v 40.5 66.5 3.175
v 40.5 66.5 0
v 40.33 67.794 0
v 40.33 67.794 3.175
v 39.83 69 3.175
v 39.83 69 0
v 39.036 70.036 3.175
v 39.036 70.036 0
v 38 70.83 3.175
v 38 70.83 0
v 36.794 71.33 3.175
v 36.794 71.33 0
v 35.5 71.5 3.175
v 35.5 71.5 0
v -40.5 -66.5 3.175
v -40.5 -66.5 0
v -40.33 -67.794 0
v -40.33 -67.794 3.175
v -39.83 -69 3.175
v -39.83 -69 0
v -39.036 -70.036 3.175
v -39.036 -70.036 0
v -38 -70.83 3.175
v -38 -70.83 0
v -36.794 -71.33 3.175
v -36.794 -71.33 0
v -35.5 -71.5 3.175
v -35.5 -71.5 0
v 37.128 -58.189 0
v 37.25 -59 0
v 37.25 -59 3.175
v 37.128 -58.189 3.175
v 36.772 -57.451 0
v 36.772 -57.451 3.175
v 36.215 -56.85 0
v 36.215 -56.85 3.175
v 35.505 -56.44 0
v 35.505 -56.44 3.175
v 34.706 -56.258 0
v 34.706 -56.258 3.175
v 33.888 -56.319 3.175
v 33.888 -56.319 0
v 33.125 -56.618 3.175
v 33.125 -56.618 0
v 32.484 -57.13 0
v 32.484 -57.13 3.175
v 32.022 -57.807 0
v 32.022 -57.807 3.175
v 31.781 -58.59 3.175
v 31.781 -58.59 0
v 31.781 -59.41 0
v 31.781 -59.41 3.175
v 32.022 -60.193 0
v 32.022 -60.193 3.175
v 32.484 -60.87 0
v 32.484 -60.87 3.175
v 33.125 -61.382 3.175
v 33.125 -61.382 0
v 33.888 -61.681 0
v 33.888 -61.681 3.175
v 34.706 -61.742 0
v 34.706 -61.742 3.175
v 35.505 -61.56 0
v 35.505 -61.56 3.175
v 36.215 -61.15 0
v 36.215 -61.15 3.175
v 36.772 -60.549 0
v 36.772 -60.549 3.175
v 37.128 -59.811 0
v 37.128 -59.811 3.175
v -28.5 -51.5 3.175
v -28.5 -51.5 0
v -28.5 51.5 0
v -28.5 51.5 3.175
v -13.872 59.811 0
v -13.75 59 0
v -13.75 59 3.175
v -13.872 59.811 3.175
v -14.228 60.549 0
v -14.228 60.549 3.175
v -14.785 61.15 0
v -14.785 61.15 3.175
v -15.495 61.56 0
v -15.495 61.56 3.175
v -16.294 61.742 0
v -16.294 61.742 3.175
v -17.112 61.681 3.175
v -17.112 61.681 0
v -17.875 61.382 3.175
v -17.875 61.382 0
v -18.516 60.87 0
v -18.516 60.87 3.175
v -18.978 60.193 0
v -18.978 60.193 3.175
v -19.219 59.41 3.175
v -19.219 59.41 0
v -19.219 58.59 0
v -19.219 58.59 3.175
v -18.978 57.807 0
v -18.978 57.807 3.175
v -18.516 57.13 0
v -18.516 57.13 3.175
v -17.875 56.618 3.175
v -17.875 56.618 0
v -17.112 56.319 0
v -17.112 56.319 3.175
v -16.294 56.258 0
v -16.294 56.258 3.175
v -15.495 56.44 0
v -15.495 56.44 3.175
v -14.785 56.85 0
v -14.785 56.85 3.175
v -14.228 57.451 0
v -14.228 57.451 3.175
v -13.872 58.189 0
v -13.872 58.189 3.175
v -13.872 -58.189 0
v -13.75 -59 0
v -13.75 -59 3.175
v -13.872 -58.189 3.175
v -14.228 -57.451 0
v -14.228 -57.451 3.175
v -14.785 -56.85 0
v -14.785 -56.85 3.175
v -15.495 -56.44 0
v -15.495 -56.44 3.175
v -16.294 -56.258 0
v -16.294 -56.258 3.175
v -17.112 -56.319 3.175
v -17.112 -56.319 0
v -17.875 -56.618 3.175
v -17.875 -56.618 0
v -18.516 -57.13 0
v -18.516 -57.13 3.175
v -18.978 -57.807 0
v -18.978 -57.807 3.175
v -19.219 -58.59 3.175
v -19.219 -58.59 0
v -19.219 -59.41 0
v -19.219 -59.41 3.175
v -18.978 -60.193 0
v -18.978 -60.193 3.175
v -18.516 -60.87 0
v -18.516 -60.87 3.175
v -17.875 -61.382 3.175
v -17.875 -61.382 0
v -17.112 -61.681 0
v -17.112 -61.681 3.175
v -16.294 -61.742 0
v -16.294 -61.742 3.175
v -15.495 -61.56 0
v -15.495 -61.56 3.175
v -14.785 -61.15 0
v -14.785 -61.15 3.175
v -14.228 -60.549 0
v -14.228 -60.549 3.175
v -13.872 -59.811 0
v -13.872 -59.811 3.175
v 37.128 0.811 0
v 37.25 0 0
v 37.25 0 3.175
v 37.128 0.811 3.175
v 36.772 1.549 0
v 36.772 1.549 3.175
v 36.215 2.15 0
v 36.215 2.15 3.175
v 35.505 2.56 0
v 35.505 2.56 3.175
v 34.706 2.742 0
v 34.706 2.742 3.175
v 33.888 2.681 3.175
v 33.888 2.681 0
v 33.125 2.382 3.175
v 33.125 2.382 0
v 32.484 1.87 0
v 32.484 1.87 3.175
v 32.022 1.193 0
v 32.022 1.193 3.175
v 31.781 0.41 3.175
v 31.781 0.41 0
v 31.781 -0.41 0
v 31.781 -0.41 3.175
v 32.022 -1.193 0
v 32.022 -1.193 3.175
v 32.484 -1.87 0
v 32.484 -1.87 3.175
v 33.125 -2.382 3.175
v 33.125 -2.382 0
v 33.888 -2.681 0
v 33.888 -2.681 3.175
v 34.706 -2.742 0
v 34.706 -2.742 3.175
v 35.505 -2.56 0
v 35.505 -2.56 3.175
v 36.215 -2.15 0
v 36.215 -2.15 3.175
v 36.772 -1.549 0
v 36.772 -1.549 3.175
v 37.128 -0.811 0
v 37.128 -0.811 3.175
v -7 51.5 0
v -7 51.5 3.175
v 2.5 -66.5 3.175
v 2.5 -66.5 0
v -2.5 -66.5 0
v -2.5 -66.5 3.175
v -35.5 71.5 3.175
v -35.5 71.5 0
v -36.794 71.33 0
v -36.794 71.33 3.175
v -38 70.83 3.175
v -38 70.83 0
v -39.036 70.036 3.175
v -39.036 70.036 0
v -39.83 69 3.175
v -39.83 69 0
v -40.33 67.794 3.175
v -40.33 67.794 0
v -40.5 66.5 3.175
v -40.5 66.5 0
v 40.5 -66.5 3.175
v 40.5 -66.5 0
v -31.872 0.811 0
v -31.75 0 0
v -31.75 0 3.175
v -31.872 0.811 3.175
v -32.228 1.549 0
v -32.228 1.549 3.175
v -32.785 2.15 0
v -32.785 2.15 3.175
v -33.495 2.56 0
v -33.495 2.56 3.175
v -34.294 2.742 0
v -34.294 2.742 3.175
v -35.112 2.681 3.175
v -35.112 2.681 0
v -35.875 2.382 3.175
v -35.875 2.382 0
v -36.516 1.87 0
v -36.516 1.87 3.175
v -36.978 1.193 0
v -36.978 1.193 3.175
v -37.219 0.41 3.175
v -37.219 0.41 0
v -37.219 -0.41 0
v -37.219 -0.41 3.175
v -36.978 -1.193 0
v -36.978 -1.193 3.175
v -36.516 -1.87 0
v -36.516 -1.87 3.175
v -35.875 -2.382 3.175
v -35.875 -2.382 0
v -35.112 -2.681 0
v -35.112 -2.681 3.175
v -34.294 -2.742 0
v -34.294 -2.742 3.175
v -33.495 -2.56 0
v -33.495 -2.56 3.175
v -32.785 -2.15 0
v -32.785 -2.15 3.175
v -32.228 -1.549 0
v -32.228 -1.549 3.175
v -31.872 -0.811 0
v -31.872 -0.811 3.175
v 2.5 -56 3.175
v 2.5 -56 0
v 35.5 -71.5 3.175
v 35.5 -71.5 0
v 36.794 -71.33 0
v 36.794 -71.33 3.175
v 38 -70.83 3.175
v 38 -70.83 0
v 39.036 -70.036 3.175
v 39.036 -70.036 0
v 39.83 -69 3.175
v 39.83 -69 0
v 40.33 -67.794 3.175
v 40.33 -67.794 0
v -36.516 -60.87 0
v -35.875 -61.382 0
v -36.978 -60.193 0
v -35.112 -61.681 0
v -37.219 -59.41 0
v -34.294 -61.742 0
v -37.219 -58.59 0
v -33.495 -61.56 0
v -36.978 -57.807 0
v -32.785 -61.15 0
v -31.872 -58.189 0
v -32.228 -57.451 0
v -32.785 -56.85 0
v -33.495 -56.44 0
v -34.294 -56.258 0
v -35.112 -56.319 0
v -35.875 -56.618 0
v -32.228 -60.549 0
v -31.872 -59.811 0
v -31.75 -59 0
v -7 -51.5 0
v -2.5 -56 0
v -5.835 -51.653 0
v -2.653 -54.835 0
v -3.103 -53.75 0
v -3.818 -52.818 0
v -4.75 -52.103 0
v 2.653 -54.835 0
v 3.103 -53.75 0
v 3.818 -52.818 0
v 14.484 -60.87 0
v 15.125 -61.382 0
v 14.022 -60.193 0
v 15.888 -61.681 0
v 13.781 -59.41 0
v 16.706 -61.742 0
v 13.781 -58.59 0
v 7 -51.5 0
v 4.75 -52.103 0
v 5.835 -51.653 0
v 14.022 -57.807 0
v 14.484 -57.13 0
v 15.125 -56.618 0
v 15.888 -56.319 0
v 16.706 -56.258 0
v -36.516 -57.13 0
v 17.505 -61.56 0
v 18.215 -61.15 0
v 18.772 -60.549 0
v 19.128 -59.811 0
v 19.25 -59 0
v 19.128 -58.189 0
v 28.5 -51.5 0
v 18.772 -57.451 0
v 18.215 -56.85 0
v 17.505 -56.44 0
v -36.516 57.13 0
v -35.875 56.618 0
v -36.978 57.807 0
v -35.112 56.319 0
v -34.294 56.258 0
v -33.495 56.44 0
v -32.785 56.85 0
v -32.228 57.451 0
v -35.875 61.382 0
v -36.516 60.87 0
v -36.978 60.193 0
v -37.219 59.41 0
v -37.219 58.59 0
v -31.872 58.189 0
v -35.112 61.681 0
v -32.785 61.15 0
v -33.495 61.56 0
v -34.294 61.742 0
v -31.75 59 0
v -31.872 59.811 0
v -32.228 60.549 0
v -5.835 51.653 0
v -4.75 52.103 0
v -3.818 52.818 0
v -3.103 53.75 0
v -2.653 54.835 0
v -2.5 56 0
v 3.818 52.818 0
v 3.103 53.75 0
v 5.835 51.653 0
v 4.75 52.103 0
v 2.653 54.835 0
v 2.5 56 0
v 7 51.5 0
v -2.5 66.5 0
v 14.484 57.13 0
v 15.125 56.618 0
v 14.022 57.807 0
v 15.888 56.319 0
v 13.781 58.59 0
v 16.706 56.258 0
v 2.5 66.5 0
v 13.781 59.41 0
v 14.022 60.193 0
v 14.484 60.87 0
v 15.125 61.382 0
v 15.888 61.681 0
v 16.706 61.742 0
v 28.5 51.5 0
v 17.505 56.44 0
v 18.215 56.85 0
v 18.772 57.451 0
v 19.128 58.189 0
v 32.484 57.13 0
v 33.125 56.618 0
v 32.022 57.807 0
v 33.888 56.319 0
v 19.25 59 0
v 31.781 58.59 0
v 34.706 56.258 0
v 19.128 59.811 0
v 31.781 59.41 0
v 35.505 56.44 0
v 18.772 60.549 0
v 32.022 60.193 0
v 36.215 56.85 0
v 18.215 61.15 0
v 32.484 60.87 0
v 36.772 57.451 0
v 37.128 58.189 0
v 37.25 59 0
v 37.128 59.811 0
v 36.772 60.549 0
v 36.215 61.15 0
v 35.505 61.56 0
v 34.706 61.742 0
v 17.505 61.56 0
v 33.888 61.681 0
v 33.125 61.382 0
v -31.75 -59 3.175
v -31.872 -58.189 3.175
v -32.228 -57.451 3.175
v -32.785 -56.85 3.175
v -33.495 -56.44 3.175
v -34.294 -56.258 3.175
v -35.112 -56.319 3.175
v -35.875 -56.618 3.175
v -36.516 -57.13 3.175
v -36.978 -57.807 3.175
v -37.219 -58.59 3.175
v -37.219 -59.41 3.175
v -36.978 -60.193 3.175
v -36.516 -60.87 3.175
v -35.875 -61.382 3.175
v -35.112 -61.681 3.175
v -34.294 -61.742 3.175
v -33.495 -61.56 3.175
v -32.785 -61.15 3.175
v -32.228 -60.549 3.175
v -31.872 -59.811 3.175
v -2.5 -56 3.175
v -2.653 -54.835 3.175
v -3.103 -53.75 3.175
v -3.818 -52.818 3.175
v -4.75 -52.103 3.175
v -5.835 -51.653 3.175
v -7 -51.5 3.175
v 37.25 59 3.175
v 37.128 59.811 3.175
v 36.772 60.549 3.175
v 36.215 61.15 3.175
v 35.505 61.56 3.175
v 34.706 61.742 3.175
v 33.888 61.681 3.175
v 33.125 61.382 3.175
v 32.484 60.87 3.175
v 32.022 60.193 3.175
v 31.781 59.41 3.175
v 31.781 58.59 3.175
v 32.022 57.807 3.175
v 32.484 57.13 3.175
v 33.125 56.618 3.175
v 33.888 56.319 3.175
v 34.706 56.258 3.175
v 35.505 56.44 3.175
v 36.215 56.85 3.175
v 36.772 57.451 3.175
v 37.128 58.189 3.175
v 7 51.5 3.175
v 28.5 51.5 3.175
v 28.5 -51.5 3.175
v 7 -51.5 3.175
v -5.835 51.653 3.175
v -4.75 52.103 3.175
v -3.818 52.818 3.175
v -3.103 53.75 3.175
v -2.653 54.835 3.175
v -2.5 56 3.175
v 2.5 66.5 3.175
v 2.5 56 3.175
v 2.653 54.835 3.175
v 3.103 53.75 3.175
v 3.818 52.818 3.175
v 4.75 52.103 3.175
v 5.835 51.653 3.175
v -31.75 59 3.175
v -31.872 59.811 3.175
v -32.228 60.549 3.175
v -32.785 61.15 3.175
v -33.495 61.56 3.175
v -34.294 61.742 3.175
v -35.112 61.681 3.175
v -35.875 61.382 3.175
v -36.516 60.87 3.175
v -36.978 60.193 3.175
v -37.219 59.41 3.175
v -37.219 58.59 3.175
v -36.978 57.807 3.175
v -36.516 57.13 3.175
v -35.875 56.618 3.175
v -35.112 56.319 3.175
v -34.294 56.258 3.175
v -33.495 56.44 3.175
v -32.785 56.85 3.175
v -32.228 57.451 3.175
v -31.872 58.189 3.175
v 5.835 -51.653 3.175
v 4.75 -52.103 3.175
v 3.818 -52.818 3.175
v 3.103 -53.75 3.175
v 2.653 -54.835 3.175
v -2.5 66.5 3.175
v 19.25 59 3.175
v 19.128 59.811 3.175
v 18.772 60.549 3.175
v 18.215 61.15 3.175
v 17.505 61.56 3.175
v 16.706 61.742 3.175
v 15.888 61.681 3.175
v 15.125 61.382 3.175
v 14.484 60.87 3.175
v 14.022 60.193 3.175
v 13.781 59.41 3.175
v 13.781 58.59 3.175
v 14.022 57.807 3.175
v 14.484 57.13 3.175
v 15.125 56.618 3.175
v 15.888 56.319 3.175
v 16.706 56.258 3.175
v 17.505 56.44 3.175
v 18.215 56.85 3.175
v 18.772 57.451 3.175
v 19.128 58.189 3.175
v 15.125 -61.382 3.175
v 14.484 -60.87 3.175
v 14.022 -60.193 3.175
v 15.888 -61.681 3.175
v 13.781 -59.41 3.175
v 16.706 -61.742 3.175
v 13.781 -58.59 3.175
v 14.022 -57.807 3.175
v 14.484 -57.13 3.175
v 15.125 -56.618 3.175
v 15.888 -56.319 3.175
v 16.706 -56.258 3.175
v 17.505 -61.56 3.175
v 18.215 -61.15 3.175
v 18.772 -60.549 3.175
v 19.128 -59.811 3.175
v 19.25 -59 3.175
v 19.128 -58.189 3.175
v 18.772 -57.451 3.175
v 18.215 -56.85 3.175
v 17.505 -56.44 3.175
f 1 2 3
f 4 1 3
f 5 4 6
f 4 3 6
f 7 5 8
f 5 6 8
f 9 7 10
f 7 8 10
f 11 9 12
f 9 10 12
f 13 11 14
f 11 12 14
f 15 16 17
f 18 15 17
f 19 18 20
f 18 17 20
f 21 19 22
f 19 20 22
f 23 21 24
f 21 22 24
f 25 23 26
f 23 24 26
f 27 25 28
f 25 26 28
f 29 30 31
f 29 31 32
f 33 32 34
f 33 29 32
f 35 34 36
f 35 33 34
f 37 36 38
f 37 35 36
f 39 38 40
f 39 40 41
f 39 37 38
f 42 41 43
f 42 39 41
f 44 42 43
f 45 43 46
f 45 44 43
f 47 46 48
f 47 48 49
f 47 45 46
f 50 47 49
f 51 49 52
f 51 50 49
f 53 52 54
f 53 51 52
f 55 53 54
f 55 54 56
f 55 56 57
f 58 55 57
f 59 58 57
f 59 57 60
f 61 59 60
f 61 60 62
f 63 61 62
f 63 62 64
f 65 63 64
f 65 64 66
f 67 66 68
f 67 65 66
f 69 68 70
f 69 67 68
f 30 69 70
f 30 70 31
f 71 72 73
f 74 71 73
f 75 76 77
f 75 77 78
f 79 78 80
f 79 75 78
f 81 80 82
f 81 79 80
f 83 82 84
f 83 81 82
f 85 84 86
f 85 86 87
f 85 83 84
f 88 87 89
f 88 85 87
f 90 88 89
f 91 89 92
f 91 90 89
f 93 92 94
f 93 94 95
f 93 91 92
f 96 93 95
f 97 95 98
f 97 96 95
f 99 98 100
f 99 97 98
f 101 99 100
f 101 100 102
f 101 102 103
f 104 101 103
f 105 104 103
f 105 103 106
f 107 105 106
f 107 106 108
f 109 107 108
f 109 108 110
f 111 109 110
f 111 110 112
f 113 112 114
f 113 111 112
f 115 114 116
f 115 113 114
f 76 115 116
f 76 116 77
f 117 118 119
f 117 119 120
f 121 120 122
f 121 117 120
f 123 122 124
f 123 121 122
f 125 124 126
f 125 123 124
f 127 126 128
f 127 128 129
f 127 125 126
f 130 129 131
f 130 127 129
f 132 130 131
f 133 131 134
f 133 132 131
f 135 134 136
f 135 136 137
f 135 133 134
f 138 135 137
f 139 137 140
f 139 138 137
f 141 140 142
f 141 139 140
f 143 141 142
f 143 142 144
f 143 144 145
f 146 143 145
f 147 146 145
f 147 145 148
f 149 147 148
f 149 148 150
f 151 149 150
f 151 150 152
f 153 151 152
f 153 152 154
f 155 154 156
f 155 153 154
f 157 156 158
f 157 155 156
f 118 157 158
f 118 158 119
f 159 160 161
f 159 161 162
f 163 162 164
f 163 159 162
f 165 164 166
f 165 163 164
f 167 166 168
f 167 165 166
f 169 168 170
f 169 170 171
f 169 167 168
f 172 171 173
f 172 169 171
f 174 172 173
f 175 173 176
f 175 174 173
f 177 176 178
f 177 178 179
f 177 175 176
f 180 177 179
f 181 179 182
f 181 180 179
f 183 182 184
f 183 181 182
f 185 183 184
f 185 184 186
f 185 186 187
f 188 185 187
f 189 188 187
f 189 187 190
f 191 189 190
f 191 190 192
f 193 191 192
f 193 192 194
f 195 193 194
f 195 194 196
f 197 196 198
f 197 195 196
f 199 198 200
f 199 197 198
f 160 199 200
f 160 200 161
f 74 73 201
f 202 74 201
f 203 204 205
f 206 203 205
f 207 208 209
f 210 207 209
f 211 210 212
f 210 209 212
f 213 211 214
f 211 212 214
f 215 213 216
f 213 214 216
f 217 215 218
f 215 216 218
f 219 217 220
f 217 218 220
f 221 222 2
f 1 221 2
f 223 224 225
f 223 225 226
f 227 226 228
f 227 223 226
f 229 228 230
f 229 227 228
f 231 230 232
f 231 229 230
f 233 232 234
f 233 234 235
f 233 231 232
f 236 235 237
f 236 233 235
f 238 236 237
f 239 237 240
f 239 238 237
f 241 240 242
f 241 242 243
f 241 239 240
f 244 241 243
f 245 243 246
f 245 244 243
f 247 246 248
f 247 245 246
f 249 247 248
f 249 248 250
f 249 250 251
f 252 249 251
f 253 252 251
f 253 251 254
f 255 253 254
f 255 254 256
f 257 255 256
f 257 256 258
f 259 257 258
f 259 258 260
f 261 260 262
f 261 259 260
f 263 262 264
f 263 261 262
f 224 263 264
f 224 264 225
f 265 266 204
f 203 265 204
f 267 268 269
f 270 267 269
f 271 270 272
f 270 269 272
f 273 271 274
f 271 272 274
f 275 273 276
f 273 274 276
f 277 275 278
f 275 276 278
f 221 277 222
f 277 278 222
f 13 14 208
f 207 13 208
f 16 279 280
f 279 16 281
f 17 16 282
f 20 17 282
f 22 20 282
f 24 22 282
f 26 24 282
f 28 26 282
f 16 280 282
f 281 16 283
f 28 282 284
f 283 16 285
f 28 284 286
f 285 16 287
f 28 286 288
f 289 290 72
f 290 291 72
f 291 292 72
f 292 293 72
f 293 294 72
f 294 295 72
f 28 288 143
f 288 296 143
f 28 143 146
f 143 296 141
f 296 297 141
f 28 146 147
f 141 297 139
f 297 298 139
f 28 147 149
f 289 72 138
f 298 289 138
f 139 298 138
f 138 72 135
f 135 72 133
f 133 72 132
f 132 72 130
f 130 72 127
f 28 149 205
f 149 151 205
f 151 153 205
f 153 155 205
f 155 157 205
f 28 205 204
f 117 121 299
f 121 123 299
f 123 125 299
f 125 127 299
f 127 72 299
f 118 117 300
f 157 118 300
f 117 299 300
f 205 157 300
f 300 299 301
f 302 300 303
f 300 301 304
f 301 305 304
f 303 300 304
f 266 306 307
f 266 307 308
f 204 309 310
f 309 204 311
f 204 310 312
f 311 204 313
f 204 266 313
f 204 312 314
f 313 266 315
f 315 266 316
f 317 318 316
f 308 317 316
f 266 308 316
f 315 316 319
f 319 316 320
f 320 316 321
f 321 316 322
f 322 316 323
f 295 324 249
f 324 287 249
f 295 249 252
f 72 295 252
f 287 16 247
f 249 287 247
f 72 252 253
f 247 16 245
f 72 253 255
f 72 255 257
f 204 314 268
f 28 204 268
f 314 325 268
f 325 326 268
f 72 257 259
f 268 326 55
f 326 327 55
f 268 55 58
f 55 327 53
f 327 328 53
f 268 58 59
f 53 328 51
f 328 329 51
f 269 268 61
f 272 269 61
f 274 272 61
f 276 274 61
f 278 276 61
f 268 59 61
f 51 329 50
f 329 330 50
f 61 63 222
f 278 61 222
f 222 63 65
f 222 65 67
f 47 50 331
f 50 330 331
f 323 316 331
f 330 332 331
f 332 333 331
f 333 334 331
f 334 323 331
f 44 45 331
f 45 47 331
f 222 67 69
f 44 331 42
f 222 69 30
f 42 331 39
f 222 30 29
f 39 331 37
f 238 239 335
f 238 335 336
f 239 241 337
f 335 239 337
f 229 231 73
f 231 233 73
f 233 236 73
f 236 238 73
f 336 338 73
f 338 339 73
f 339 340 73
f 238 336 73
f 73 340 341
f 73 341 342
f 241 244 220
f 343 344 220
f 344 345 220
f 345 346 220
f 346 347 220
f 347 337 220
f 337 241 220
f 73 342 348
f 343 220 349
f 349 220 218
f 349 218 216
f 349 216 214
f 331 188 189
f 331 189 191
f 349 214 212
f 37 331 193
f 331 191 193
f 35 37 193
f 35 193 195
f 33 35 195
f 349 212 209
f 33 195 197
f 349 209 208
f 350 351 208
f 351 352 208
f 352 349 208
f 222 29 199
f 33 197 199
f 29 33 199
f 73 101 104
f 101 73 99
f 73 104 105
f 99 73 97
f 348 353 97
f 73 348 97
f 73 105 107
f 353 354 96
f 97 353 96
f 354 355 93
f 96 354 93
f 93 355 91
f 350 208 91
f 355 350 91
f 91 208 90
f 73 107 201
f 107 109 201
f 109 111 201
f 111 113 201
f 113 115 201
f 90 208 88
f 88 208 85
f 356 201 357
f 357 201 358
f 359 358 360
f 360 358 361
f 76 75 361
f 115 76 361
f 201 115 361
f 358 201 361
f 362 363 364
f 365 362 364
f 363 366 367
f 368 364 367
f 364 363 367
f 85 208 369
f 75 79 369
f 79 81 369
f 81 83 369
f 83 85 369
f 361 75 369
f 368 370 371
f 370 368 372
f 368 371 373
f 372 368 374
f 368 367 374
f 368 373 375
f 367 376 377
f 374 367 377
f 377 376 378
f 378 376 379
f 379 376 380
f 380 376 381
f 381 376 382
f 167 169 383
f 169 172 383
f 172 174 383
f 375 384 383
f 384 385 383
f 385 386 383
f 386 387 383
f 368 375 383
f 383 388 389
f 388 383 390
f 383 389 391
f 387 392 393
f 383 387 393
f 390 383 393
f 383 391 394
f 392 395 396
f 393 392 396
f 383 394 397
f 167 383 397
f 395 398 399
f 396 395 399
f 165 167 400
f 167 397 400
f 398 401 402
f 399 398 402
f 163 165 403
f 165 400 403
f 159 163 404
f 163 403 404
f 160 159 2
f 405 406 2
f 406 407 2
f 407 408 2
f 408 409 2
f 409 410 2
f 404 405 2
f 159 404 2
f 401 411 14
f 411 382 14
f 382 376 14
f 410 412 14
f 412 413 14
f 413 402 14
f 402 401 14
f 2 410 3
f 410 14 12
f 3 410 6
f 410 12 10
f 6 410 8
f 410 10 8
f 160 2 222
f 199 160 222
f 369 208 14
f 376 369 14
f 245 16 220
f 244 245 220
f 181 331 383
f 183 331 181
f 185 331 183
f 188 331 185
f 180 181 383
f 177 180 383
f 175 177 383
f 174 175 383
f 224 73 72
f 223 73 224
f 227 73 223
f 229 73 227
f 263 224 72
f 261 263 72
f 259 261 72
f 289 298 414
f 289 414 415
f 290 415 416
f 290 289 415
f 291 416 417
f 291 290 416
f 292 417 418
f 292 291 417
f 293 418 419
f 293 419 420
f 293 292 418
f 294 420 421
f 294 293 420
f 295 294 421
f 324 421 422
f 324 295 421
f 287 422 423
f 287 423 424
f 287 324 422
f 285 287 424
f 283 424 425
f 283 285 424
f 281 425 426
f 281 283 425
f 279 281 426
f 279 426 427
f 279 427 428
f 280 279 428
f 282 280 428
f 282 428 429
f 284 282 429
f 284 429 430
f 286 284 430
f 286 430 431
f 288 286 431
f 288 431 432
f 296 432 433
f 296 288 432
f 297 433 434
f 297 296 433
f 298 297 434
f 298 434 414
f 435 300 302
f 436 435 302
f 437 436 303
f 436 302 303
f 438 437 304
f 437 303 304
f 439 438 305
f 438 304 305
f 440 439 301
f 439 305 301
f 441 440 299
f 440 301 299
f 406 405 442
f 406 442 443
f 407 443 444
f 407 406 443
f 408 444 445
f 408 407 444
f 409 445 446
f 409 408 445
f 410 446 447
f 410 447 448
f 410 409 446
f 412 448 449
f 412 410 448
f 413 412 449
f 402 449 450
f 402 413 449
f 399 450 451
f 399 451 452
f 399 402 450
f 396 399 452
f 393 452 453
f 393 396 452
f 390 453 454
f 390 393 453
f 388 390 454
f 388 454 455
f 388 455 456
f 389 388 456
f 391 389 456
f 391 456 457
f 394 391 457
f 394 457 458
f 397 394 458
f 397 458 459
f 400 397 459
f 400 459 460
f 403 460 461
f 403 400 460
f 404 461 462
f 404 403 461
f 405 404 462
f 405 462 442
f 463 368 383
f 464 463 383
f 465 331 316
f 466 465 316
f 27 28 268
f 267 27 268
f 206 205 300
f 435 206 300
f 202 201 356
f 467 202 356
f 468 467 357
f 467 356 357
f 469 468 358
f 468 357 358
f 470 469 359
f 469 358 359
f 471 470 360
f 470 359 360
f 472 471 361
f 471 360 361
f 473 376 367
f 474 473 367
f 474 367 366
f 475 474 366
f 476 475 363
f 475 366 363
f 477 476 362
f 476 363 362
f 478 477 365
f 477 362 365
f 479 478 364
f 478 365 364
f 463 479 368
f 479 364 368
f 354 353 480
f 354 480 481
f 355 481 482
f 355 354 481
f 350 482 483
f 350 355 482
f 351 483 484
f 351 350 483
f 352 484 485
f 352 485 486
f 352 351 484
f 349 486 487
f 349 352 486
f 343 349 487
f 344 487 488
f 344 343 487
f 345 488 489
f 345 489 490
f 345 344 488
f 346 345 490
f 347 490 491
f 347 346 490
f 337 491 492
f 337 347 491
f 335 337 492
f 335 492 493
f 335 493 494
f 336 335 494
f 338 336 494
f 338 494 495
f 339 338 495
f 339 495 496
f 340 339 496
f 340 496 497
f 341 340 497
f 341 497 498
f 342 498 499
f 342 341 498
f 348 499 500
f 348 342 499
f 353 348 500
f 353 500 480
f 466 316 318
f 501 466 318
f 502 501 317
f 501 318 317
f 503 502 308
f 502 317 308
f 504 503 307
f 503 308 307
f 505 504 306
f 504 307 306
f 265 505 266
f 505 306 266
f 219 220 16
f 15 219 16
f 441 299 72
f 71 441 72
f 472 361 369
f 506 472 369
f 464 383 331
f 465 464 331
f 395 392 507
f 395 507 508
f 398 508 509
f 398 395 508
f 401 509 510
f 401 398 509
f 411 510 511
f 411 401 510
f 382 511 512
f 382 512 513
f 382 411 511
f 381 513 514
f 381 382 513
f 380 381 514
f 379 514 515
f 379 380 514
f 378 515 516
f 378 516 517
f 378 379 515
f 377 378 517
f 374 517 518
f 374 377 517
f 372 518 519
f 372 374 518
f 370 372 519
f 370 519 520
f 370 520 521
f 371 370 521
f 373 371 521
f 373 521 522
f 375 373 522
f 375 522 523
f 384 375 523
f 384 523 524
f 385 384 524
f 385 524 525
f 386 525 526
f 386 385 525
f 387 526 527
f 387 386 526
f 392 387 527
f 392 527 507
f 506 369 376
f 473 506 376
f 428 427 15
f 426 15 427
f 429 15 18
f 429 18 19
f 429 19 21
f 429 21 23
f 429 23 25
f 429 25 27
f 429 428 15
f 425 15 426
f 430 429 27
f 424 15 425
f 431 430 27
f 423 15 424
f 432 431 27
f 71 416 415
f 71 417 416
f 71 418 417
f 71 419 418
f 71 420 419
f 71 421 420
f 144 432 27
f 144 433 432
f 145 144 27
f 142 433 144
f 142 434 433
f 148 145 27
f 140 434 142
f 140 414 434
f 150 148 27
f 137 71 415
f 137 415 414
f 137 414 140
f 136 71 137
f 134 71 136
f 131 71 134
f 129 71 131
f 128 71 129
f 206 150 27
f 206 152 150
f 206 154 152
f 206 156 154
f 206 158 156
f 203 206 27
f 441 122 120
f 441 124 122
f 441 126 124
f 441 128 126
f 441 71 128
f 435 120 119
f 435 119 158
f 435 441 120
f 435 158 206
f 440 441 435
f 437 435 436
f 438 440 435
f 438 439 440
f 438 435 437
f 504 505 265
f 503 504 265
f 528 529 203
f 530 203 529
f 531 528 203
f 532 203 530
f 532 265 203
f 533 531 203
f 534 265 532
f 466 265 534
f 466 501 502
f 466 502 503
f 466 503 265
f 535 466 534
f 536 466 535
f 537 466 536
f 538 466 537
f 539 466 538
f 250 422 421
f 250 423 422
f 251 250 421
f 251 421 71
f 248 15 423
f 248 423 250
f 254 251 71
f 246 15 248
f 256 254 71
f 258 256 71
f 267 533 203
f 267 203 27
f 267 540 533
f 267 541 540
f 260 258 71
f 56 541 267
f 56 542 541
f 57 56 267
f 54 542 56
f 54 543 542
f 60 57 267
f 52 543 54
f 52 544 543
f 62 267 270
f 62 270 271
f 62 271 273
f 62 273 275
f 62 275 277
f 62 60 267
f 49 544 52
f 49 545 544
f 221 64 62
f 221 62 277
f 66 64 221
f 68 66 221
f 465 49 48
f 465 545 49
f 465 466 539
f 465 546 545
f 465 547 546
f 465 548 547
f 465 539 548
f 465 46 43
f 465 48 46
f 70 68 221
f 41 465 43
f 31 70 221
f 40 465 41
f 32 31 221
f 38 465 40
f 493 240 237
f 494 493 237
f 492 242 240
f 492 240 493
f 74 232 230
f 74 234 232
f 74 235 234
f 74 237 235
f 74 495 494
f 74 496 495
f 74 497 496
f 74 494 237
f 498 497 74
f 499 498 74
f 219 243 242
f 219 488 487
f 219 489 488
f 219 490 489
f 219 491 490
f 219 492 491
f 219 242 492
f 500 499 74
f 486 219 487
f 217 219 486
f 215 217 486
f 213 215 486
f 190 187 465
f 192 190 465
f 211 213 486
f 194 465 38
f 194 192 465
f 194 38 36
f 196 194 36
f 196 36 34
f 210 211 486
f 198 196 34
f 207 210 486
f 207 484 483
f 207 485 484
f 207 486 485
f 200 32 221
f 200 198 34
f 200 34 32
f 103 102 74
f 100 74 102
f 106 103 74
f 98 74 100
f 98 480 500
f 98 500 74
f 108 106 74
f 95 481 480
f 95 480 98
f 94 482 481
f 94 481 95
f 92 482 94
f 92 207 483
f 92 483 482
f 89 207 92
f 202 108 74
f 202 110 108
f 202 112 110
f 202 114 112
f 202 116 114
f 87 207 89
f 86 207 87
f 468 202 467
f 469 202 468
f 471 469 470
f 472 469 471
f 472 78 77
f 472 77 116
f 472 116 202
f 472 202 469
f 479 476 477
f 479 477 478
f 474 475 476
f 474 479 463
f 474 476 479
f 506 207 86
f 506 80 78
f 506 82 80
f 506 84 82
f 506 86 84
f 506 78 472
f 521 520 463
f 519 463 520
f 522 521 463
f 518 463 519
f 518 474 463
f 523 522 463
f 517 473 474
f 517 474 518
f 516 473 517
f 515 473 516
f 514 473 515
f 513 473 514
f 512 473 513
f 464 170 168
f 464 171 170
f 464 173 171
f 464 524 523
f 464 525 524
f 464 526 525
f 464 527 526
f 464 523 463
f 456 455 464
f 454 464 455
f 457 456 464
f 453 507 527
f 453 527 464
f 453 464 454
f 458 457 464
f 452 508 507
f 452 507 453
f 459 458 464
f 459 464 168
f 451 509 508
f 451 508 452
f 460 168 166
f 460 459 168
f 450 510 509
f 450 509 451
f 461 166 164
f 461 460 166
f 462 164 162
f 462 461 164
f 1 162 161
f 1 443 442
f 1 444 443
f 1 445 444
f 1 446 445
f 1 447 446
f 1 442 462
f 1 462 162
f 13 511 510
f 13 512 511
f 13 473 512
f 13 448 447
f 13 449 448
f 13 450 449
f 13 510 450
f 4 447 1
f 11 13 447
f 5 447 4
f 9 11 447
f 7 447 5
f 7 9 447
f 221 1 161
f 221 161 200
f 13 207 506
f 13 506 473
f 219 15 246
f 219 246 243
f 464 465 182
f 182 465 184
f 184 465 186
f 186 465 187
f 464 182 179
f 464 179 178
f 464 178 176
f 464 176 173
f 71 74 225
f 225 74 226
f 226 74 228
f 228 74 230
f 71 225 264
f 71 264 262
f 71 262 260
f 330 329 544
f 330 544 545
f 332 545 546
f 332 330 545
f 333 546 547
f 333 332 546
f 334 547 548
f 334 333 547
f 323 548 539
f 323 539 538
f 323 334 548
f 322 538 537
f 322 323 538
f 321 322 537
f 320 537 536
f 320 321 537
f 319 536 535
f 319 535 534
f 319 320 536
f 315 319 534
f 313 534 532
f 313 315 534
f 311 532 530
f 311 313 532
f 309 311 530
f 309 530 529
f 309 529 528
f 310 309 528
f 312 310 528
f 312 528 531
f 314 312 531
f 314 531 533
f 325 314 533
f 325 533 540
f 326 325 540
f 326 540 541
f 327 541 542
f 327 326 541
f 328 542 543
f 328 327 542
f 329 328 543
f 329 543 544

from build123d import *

# Parameters (mm, degrees)
F0_R     = 2.75
F1_DEPTH = 3.175


# Not quite as in the source:
# - a length typed as a fraction of an inch, garbled in the dataset ("3 / 203.2 mm" for 3/8 in), is restored


with BuildPart() as f1:
    # F0 (on Top) → F1 (new body)
    with BuildSketch(Plane.XY):
        with BuildLine():
            Line((-35.5, -71.5), (35.5, -71.5))
            ThreePointArc((35.5, -71.5), (39.0355339059, -70.0355339059), (40.5, -66.5))
            Line((40.5, -66.5), (40.5, 66.5))
            ThreePointArc((40.5, 66.5), (39.0355339059, 70.0355339059), (35.5, 71.5))
            Line((35.5, 71.5), (-35.5, 71.5))
            ThreePointArc((-35.5, 71.5), (-39.0355339059, 70.0355339059), (-40.5, 66.5))
            Line((-40.5, 66.5), (-40.5, -66.5))
            ThreePointArc((-40.5, -66.5), (-39.0355339059, -70.0355339059), (-35.5, -71.5))
        make_face()
        with Locations((-34.5, -59)):
            Circle(F0_R, mode=Mode.SUBTRACT)
        with Locations((-16.5, -59)):
            Circle(F0_R, mode=Mode.SUBTRACT)
        with Locations((16.5, -59)):
            Circle(F0_R, mode=Mode.SUBTRACT)
        with Locations((34.5, -59)):
            Circle(F0_R, mode=Mode.SUBTRACT)
        with Locations((-34.5, 0)):
            Circle(F0_R, mode=Mode.SUBTRACT)
        with Locations((-34.5, 59)):
            Circle(F0_R, mode=Mode.SUBTRACT)
        with Locations((-16.5, 59)):
            Circle(F0_R, mode=Mode.SUBTRACT)
        with BuildLine():
            Line((28.5, 51.5), (28.5, -51.5))
            Line((28.5, -51.5), (7, -51.5))
            ThreePointArc((7, -51.5), (3.8180194847, -52.8180194847), (2.5, -56))
            Line((2.5, -56), (2.5, -66.5))
            Line((2.5, -66.5), (-2.5, -66.5))
            Line((-2.5, -66.5), (-2.5, -56))
            ThreePointArc((-2.5, -56), (-3.8180194847, -52.8180194847), (-7, -51.5))
            Line((-7, -51.5), (-28.5, -51.5))
            Line((-28.5, -51.5), (-28.5, 51.5))
            Line((-28.5, 51.5), (-7, 51.5))
            ThreePointArc((-7, 51.5), (-3.8180194847, 52.8180194847), (-2.5, 56))
            Line((-2.5, 56), (-2.5, 66.5))
            Line((-2.5, 66.5), (2.5, 66.5))
            Line((2.5, 66.5), (2.5, 56))
            ThreePointArc((2.5, 56), (3.8180194847, 52.8180194847), (7, 51.5))
            Line((7, 51.5), (28.5, 51.5))
        make_face(mode=Mode.SUBTRACT)
        with Locations((34.5, 0)):
            Circle(F0_R, mode=Mode.SUBTRACT)
        with Locations((16.5, 59)):
            Circle(F0_R, mode=Mode.SUBTRACT)
        with Locations((34.5, 59)):
            Circle(F0_R, mode=Mode.SUBTRACT)
    extrude(amount=F1_DEPTH)


solid = f1.part
